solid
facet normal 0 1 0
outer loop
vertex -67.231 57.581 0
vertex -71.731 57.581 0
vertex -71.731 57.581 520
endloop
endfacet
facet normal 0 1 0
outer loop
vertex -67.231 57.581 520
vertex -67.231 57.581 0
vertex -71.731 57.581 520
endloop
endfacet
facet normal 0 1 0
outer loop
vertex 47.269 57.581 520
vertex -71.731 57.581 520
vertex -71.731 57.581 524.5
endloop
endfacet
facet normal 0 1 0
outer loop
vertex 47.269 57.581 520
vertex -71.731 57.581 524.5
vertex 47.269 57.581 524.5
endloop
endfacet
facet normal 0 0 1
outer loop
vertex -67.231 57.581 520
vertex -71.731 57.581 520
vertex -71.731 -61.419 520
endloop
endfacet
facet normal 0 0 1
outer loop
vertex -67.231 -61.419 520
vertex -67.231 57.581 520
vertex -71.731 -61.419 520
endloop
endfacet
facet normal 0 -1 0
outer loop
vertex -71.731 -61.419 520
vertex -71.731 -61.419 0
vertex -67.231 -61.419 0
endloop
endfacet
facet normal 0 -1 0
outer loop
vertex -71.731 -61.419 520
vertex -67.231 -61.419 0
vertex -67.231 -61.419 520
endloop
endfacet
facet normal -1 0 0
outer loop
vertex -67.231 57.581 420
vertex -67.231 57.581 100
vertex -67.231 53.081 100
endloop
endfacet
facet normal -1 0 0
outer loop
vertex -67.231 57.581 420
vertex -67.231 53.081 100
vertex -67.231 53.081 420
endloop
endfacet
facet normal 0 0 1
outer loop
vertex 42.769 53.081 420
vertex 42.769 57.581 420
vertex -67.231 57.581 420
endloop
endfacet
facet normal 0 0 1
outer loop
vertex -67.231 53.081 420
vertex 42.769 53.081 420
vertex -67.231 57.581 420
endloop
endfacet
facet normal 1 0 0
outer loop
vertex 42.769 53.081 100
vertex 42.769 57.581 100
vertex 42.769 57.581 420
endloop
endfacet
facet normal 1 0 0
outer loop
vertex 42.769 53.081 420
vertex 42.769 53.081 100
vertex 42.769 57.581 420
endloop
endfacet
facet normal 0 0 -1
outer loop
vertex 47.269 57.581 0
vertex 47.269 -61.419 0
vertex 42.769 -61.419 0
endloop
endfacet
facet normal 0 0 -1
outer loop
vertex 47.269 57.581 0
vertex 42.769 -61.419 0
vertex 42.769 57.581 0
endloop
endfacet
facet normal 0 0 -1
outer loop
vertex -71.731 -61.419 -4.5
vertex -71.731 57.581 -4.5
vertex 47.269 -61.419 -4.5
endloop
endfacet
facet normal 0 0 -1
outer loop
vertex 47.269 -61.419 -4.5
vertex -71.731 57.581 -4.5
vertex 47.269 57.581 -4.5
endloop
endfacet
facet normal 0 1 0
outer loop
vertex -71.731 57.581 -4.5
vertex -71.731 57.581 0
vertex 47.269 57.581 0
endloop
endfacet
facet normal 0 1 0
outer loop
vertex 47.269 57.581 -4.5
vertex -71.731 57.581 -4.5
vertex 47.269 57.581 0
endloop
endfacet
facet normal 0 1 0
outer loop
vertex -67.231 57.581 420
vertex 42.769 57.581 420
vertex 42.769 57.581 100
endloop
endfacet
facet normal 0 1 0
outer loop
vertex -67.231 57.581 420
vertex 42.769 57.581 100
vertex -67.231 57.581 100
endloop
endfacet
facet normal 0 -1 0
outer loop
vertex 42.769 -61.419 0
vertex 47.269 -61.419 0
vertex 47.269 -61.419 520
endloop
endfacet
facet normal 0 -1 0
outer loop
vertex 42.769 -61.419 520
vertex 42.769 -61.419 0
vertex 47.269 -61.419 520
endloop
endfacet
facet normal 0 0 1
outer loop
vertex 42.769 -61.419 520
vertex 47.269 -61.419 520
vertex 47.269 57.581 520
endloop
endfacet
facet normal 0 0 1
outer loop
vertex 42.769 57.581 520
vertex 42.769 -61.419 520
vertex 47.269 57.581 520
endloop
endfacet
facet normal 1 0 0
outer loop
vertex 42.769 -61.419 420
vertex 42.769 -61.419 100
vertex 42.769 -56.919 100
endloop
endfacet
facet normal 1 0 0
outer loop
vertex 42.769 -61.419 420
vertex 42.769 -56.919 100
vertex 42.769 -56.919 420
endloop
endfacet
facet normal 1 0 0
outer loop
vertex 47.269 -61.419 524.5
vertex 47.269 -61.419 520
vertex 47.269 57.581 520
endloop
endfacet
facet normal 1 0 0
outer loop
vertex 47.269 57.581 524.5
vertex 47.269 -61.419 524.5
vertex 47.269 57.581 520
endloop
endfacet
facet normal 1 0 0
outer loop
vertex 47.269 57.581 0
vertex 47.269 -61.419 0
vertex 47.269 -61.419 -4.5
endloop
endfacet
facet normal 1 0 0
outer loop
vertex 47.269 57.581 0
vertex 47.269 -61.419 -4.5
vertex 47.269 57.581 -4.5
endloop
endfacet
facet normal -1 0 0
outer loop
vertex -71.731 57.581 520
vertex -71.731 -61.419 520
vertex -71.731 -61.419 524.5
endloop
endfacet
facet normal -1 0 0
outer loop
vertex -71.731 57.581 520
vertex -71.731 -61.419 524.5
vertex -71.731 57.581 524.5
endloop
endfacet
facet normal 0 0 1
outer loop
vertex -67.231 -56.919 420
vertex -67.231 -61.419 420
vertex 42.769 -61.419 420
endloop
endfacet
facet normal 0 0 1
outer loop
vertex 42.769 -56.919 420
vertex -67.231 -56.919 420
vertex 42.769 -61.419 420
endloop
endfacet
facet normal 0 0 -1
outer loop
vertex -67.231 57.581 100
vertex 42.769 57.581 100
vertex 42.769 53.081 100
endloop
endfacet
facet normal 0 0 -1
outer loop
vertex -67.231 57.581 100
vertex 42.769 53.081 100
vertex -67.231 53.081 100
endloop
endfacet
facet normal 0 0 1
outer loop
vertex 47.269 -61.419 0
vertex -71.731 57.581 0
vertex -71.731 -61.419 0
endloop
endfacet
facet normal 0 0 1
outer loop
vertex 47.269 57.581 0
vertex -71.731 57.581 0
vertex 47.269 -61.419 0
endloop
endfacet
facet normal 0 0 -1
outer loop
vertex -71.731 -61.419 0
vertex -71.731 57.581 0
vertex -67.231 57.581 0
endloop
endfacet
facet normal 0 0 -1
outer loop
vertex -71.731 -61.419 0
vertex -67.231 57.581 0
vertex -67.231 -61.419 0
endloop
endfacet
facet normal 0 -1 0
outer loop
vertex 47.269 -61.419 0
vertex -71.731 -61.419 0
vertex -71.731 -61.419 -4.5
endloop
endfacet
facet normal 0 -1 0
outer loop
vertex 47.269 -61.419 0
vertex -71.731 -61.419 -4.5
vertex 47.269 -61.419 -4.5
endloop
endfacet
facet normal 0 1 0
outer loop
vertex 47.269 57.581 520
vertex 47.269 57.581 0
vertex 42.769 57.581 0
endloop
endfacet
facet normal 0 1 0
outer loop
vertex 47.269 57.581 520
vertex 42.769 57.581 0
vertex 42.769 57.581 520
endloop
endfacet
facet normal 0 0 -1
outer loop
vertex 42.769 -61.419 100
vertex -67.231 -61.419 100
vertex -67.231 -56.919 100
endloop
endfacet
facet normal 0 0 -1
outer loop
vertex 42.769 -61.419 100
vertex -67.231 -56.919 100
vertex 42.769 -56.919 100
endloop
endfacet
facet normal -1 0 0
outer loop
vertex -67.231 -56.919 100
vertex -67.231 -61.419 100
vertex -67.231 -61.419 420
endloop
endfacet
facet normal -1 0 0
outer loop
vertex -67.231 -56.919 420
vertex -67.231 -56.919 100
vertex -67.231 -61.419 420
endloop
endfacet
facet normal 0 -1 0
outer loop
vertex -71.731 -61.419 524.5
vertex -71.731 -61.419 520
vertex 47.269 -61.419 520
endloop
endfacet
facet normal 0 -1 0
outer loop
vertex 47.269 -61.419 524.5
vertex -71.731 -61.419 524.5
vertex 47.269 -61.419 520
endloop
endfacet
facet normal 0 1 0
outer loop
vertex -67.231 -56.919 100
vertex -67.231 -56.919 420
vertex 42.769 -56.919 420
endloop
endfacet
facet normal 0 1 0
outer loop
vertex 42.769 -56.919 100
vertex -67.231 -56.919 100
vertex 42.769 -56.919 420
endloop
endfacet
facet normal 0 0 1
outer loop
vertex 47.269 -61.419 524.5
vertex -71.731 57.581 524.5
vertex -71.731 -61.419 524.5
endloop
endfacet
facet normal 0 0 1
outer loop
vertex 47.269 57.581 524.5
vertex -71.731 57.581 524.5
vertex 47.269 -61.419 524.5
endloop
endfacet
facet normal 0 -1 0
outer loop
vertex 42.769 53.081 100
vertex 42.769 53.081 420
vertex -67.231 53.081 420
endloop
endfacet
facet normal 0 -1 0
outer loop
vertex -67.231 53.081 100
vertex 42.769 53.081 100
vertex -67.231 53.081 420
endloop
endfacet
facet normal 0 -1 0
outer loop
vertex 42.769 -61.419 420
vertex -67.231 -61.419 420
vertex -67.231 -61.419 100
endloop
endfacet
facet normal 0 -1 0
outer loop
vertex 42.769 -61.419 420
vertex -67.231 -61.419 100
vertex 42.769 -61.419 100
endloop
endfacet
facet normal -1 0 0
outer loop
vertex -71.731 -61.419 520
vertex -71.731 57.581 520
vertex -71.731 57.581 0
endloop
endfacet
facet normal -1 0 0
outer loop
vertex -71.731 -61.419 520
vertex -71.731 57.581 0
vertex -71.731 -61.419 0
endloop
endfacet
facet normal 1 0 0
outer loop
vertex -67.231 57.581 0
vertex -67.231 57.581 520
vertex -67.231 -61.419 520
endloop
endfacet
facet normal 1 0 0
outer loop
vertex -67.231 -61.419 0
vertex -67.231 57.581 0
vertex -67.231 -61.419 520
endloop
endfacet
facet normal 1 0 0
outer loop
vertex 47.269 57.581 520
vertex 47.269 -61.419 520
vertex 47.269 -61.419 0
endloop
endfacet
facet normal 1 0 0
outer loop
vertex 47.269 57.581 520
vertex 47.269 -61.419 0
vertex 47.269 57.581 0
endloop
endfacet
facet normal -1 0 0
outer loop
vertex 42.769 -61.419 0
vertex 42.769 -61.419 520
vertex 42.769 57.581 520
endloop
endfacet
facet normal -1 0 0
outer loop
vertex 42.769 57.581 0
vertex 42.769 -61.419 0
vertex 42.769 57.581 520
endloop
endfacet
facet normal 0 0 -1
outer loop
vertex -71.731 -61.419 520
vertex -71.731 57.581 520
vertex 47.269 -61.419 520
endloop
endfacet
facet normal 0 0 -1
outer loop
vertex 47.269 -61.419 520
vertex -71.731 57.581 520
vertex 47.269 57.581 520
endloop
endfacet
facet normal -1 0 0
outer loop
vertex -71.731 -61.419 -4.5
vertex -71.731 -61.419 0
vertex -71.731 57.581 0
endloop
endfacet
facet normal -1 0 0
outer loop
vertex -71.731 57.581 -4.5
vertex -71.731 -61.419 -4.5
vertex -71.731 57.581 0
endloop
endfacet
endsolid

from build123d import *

# Parameters (mm, degrees)
F0_W      = 119
F0_H      = 119
F1_DEPTH  = 4.5
F2_W      = 119
F2_H      = 520
F3_DEPTH  = 4.5
F4_W      = 119
F4_H      = 520
F5_DEPTH  = 4.5
F6_W      = 119
F6_H      = 119
F7_DEPTH  = 4.5
F8_W      = 110
F8_H      = 320
F9_DEPTH  = 4.5
F10_W     = 110
F10_H     = 320
F11_DEPTH = 4.5


with BuildPart() as f1:
    # F0 (on Top) → F1 (new body)
    with BuildSketch(Plane.XY):
        with Locations((-12.230827, -1.918554)):
            Rectangle(F0_W, F0_H)
    extrude(amount=-F1_DEPTH)


with BuildPart() as f3:
    # F2 (on face) → F3 (new body)
    with BuildSketch(Plane.YZ.offset(47.269173)):
        with Locations((-1.918554, 260)):
            Rectangle(F2_W, F2_H)
    extrude(amount=-F3_DEPTH)


with BuildPart() as f5:
    # F4 (on face) → F5 (new body)
    with BuildSketch(Plane(origin=(-71.730827, 0, 0), x_dir=(0, -1, 0), z_dir=(-1, 0, 0))):
        with Locations((1.918554, 260)):
            Rectangle(F4_W, F4_H)
    extrude(amount=-F5_DEPTH)


with BuildPart() as f7:
    # F6 (on face) → F7 (new body)
    with BuildSketch(Plane.XY.offset(520)):
        with Locations((-12.230827, -1.918554)):
            Rectangle(F6_W, F6_H)
    extrude(amount=F7_DEPTH)


with BuildPart() as f9:
    # F8 (on face) → F9 (new body)
    with BuildSketch(Plane.XZ.offset(61.418554)):
        with Locations((-12.230827, 260)):
            Rectangle(F8_W, F8_H)
    extrude(amount=-F9_DEPTH)


with BuildPart() as f11:
    # F10 (on face) → F11 (new body)
    with BuildSketch(Plane(origin=(0, 57.581446, 0), x_dir=(-1, 0, 0), z_dir=(0, 1, 0))):
        with Locations((12.230827, 260)):
            Rectangle(F10_W, F10_H)
    extrude(amount=-F11_DEPTH)


solid = Compound([f1.part, f3.part, f5.part, f7.part, f9.part, f11.part])
